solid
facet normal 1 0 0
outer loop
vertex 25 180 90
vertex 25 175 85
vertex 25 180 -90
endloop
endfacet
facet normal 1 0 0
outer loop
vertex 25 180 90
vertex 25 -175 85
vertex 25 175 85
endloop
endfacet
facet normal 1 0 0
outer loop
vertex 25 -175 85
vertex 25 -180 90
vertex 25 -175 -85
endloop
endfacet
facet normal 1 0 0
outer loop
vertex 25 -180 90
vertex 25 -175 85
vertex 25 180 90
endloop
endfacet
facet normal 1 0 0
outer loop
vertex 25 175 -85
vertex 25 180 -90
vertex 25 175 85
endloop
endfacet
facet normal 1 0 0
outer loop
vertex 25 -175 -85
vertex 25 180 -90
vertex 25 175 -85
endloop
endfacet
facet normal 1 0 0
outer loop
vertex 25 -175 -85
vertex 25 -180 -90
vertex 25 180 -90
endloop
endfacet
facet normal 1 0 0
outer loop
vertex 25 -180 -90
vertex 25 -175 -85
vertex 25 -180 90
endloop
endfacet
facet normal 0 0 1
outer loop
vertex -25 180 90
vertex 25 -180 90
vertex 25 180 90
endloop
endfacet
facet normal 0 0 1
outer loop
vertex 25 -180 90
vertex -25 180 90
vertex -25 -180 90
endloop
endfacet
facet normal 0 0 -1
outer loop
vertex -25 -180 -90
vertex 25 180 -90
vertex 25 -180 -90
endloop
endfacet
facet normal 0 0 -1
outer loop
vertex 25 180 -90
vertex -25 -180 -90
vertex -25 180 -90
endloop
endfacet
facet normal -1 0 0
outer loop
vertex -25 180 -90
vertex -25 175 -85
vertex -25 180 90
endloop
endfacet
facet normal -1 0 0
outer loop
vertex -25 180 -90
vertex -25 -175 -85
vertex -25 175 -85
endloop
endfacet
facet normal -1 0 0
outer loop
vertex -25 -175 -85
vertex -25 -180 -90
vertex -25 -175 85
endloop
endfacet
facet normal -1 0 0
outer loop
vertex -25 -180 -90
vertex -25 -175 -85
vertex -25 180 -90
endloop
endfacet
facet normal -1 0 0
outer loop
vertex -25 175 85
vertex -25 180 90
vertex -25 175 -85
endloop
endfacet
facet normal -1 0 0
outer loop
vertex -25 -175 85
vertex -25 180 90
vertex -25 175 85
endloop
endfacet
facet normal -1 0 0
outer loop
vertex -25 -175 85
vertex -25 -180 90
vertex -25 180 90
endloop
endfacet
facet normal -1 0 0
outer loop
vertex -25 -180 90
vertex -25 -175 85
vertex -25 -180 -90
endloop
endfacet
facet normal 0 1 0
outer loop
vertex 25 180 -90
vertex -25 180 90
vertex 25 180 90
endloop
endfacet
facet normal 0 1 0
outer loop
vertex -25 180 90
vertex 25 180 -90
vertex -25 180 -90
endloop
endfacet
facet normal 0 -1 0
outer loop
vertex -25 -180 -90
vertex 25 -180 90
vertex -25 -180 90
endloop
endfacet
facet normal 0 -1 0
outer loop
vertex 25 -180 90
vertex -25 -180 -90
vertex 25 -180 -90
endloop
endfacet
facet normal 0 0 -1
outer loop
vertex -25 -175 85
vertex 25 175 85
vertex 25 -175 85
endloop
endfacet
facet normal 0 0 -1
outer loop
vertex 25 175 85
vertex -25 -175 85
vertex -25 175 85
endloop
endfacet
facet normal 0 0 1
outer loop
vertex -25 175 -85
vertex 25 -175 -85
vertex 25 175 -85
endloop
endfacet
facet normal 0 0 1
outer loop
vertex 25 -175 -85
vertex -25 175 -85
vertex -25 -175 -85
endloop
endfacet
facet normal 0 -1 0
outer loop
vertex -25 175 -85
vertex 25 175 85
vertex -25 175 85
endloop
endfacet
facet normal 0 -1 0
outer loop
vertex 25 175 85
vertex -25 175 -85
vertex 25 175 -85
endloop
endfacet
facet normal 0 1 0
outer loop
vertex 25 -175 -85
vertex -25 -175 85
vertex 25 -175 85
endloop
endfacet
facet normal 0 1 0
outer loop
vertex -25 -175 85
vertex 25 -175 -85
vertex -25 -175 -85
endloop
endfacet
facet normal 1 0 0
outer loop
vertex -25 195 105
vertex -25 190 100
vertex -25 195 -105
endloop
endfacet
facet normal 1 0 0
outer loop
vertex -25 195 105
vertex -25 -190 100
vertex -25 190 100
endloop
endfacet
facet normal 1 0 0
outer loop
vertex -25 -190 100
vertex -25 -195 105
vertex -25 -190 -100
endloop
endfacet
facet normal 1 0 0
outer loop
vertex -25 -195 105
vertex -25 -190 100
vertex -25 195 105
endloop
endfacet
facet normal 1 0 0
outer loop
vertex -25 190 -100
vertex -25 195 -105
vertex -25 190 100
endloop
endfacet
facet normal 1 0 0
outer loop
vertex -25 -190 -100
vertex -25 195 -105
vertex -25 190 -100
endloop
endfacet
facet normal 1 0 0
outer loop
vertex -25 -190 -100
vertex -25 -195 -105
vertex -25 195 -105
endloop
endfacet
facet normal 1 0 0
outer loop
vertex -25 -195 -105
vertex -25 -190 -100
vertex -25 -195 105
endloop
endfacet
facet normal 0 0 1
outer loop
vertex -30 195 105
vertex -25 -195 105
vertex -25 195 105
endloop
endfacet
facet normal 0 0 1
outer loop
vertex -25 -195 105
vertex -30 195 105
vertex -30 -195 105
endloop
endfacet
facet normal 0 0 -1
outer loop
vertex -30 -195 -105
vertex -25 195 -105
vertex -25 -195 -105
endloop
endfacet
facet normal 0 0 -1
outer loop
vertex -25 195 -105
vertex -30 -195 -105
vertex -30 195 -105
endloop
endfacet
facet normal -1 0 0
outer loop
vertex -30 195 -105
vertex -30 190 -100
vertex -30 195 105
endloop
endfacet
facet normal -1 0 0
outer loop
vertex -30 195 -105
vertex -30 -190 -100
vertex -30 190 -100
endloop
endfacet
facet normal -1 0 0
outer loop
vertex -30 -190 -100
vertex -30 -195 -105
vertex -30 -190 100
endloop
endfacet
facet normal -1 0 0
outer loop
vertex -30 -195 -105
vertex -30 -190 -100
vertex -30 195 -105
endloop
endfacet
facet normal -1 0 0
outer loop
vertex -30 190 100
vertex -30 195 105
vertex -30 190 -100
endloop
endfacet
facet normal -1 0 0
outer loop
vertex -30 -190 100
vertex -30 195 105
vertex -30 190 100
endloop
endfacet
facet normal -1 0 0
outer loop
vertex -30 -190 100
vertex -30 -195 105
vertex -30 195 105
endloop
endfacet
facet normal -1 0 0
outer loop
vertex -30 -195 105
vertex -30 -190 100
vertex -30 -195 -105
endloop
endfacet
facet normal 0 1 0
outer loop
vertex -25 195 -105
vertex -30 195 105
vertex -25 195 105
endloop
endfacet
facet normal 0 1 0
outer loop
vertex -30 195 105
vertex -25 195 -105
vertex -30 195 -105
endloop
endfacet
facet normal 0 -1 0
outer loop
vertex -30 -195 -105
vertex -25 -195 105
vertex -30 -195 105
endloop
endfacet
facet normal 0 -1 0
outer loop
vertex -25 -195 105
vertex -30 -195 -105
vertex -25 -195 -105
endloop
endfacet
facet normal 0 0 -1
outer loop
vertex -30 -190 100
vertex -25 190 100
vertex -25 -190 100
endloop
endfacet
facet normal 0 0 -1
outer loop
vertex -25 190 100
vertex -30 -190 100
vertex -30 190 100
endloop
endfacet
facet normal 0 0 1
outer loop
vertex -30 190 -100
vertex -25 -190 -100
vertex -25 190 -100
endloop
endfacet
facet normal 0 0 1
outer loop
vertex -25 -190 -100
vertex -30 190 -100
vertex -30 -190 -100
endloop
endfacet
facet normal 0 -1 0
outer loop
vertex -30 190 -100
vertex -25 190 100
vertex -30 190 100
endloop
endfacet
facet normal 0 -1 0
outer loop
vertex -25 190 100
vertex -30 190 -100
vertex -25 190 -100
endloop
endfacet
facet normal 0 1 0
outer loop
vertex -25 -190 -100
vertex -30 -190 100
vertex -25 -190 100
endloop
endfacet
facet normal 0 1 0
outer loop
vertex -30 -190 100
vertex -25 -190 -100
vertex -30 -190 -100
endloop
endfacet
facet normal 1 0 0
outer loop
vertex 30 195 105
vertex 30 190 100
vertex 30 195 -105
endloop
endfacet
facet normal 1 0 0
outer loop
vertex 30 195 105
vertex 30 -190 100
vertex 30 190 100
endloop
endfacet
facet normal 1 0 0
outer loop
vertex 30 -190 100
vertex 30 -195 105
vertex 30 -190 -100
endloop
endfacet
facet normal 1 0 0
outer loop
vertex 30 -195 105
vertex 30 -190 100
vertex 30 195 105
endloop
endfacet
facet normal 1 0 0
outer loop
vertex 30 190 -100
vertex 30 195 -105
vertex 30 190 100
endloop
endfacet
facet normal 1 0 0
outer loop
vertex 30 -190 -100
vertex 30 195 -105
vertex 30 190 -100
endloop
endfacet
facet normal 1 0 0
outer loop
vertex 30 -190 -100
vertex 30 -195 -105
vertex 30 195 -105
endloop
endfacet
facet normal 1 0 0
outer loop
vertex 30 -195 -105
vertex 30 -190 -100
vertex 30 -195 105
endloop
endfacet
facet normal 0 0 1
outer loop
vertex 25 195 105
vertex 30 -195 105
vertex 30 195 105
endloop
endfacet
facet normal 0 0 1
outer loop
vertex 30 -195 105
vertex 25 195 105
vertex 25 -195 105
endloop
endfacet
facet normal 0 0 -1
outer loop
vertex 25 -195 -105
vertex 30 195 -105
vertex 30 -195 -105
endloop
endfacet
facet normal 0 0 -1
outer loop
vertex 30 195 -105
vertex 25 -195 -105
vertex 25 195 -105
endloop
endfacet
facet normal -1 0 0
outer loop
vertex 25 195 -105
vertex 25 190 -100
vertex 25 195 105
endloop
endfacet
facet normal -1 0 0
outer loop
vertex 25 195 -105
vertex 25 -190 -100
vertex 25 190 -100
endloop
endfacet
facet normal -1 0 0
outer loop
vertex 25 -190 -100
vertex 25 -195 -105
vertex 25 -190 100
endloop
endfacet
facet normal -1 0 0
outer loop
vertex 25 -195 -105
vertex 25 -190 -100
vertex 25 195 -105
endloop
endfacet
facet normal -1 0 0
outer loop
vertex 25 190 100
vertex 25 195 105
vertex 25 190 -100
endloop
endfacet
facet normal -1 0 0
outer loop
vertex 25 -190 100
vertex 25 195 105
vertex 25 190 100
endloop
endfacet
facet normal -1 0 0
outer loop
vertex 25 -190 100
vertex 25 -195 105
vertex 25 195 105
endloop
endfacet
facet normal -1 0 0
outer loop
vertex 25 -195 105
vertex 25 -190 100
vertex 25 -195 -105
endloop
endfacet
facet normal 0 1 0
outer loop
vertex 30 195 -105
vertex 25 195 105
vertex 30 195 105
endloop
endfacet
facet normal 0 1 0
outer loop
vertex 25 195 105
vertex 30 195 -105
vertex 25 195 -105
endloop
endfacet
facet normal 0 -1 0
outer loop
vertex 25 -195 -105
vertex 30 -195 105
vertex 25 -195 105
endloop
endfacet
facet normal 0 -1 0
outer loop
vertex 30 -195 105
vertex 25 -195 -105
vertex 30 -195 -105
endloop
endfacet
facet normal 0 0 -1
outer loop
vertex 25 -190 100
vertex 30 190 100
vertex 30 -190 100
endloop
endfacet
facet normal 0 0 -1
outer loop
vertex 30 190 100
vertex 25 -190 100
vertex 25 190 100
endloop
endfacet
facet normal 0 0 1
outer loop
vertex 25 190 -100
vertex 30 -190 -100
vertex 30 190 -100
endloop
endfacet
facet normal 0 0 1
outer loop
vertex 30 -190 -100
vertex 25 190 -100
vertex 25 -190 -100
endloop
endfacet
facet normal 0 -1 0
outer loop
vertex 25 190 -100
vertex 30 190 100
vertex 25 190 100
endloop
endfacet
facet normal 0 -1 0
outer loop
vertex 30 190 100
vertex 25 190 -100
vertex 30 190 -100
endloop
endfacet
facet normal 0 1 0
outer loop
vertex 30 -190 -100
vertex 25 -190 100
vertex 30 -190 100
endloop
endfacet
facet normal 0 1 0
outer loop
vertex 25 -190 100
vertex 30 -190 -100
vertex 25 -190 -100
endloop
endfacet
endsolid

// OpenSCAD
// OpenSCAD rectangular duct connector type B
// Units: millimeters

duct_width_mm = 360;
duct_height_mm = 180;
connector_depth_mm = 50;
wall_thickness_mm = 5;
flange_extra_mm = 30;

module hollow_box(outer_x, outer_y, depth, wall) {
    difference() {
        cube([depth, outer_x, outer_y], center = true);
        cube([depth + 2, outer_x - 2 * wall, outer_y - 2 * wall], center = true);
    }
}

union() {
    hollow_box(duct_width_mm, duct_height_mm, connector_depth_mm, wall_thickness_mm);
    translate([-connector_depth_mm / 2 - wall_thickness_mm / 2, 0, 0])
        hollow_box(duct_width_mm + flange_extra_mm, duct_height_mm + flange_extra_mm, wall_thickness_mm, wall_thickness_mm);
    translate([connector_depth_mm / 2 + wall_thickness_mm / 2, 0, 0])
        hollow_box(duct_width_mm + flange_extra_mm, duct_height_mm + flange_extra_mm, wall_thickness_mm, wall_thickness_mm);
}
